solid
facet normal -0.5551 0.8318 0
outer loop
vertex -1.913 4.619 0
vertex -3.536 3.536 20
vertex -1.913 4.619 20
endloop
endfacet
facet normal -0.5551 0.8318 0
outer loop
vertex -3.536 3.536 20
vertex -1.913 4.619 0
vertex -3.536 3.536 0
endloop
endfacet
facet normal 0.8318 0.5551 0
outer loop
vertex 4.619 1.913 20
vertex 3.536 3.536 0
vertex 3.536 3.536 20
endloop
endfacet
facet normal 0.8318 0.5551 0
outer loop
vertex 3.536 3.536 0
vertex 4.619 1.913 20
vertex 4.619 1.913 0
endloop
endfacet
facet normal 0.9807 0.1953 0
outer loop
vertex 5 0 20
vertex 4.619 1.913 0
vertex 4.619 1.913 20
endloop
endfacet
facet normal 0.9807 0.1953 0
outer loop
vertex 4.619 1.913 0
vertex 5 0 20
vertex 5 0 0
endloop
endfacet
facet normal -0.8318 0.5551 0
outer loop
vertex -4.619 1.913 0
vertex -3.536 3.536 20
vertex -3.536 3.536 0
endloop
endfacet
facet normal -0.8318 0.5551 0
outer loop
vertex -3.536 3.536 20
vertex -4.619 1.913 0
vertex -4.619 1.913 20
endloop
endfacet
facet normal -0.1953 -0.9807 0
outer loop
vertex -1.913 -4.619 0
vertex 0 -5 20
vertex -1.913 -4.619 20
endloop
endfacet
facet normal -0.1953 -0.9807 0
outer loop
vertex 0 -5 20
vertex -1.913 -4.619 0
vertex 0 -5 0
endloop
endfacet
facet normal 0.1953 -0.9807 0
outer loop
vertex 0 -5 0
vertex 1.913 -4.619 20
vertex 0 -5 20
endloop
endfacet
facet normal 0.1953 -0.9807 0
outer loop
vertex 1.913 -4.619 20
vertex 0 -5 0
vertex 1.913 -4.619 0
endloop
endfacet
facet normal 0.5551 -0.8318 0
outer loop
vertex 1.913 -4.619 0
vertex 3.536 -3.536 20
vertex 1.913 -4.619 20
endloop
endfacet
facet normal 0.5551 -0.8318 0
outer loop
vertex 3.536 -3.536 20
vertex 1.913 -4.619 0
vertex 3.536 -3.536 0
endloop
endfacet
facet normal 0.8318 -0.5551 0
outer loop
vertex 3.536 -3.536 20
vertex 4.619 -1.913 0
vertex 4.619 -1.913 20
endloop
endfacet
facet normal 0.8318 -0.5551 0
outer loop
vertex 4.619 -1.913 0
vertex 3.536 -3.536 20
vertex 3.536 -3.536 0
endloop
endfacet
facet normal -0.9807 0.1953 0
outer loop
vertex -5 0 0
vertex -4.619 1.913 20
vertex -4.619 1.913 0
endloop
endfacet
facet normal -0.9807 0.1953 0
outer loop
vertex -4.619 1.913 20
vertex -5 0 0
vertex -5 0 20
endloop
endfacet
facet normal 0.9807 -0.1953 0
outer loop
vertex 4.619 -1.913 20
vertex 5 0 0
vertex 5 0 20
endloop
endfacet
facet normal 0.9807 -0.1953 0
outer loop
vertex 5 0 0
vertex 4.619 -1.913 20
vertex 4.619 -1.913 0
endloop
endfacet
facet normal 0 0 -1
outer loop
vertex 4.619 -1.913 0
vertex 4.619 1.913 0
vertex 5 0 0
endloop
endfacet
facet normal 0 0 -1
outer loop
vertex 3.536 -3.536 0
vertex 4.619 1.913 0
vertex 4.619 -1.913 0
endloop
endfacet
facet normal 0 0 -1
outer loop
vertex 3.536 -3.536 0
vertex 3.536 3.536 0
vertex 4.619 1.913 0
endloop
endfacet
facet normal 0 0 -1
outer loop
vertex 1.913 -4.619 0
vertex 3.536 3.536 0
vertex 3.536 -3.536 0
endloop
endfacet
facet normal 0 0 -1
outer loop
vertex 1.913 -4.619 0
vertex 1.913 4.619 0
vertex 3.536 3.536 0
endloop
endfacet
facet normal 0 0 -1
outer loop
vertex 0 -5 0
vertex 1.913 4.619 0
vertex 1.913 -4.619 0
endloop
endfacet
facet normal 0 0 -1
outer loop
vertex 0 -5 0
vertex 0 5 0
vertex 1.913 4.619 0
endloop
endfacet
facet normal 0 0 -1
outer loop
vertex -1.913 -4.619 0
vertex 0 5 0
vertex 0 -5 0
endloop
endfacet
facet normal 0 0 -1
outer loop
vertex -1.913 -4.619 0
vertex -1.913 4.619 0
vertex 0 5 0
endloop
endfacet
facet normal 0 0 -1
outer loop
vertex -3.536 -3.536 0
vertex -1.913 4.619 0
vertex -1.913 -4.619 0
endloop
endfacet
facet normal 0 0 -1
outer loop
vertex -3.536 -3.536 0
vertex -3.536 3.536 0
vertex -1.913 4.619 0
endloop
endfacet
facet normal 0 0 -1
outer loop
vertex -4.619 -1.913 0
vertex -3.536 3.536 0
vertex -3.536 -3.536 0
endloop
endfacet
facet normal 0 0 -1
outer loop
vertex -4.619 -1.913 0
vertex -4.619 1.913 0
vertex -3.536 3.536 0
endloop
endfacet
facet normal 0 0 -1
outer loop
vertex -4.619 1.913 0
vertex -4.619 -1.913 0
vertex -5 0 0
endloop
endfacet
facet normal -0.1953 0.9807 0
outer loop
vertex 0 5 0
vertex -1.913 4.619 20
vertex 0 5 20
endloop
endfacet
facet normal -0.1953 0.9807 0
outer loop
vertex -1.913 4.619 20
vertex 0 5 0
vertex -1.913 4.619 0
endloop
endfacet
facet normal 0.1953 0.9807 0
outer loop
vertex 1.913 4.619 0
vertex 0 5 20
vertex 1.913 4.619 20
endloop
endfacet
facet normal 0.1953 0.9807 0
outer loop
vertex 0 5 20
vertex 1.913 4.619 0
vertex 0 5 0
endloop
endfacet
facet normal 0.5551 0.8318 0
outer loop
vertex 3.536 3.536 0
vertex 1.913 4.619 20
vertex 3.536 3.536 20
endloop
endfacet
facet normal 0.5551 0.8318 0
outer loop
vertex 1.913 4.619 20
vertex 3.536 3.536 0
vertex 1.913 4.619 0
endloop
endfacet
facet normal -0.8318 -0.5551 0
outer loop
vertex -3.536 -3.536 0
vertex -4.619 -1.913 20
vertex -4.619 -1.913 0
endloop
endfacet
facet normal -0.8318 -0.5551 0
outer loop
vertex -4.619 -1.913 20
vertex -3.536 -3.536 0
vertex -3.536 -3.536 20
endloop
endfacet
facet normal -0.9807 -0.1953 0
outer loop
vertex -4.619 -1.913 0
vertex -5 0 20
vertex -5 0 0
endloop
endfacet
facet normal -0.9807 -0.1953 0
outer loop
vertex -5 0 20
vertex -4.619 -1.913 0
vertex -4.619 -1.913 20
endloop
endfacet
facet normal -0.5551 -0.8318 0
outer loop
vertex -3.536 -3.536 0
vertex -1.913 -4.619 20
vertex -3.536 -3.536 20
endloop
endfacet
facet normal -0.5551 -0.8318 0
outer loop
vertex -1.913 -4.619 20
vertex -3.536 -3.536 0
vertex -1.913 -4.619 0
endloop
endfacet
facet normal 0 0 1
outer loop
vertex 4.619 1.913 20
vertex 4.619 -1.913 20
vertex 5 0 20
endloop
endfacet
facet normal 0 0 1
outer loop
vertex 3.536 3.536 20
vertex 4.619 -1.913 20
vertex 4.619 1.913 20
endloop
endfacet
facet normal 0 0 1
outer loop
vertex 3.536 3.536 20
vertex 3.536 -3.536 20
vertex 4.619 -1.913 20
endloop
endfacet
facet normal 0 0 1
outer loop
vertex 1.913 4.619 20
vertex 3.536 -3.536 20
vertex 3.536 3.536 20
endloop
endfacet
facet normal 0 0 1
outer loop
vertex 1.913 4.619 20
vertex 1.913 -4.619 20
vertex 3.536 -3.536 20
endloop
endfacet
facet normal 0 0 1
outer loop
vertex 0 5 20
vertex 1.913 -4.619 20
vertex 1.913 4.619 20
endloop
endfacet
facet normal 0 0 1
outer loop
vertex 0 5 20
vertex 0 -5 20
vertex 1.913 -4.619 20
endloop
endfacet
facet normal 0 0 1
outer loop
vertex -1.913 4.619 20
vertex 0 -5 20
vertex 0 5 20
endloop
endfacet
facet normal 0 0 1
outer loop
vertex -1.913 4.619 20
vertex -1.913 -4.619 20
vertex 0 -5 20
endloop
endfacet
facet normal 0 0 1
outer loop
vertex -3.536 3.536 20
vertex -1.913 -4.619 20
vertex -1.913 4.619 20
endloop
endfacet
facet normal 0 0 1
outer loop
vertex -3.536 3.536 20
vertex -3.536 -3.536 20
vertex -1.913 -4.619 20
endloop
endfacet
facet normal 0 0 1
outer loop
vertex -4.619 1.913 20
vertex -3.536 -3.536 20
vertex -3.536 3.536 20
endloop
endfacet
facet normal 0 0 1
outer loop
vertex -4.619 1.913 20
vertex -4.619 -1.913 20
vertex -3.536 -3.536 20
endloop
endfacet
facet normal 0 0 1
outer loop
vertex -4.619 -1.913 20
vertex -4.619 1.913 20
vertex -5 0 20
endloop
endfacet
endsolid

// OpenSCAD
// The exact-geometry audit's case x01 (docs/audits/exact-geometry-rust.md).
// volume: 1570.7963267948965
union() { cylinder(r=5, h=10); translate([0,0,10]) cylinder(r=5, h=10); }
